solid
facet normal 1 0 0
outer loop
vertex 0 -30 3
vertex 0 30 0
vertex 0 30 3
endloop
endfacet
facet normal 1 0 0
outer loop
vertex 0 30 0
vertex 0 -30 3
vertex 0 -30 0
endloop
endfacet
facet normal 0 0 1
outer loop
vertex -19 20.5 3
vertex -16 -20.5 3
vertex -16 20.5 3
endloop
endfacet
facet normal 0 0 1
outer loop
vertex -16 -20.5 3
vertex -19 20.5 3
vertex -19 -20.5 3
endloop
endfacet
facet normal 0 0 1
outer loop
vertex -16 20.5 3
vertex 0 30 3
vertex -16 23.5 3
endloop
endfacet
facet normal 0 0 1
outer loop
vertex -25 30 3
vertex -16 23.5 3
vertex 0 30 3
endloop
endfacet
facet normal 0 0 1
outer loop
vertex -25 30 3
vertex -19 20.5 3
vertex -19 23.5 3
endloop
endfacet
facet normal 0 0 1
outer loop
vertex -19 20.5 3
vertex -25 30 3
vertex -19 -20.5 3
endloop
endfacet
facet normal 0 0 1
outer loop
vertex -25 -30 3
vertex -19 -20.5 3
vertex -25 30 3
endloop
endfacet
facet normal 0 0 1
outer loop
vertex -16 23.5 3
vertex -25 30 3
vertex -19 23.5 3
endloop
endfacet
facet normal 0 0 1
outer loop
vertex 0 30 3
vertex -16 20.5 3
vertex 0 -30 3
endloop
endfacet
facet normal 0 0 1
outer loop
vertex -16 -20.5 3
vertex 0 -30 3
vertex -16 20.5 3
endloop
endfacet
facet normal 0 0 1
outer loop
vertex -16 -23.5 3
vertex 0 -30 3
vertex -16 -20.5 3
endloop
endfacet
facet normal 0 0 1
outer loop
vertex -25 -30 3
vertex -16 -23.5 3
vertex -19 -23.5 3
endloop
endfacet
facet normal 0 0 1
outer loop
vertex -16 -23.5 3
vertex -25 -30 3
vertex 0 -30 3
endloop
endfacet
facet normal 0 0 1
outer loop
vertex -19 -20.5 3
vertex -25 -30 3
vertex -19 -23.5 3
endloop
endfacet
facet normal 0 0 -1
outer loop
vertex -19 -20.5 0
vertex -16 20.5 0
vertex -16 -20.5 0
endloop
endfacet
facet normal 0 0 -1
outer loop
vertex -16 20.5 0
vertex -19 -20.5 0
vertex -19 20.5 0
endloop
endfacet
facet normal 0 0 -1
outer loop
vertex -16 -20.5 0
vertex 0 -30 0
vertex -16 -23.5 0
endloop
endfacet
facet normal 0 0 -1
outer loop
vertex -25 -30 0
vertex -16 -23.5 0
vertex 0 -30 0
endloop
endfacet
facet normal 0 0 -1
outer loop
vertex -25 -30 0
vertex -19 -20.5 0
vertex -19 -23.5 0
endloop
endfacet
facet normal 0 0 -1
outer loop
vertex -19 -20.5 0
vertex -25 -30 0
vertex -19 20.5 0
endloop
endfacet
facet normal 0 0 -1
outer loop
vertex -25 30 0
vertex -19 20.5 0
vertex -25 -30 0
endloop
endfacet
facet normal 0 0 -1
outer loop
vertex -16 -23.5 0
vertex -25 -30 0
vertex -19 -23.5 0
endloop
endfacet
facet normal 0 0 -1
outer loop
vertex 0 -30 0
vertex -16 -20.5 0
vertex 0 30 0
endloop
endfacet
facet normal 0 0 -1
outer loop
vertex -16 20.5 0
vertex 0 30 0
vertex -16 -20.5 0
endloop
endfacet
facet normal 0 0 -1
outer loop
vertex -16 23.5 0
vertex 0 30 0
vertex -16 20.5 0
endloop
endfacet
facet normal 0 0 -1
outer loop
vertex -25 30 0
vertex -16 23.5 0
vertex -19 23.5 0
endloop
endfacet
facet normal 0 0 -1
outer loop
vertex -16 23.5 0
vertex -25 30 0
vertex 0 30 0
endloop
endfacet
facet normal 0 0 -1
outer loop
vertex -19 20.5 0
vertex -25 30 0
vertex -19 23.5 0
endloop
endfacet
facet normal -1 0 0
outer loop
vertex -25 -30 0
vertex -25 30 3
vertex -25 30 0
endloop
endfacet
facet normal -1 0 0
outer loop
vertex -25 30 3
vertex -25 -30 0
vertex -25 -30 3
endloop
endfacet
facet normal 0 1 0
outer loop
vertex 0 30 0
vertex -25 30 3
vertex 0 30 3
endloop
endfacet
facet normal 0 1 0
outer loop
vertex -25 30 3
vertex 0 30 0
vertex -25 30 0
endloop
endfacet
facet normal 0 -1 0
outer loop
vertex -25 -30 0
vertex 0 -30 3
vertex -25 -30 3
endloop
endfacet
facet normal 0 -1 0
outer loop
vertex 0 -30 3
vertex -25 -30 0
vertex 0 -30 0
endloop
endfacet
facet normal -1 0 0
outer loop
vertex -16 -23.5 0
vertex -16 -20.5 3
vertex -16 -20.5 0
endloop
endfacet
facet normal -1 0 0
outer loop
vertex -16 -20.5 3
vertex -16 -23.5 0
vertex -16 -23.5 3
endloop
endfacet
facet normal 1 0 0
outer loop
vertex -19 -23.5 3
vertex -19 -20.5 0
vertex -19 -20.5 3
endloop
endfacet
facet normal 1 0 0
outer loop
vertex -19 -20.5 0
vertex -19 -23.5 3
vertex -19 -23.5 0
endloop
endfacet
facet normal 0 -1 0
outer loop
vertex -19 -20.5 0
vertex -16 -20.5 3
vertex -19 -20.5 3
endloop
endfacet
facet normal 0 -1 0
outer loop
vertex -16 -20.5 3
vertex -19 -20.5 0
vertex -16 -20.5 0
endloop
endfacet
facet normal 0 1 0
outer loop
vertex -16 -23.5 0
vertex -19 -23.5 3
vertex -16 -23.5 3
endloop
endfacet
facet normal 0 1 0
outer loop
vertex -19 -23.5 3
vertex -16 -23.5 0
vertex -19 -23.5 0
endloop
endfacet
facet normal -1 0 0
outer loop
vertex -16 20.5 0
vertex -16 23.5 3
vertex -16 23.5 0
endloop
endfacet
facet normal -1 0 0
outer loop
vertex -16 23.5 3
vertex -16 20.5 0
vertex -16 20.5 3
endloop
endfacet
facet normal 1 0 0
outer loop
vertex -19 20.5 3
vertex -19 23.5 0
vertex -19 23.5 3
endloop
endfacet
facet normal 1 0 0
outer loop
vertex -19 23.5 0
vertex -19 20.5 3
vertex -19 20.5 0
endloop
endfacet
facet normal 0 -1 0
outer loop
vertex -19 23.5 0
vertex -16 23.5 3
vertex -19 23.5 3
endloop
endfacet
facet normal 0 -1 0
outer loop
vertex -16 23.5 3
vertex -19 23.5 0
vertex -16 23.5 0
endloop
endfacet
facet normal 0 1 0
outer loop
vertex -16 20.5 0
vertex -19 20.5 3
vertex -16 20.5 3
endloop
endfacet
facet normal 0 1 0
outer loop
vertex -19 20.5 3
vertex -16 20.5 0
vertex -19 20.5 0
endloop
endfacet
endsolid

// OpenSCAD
// file: config.scad
/**
 * All measures in millimeters.
 */

$fn = 200;
nothing = 0.05;

material_z = 3;

stairs_x = 150;
stairs_z = 120;

step_count = 7;
step_x = 25;
step_y = 60;
step_support_radius = step_x - material_z;

stairs_support_inset = 8;

step_color = "brown";
support_color = "yellow";
// main file
include <config.scad>;

module step_positive()
{
    color(step_color)
    translate([
        -step_x/2,
        0,
        material_z/2
        ])
    cube([
        step_x,
        step_y,
        material_z
        ], center=true);
}

module step()
{
    difference()
    {
        step_positive();

        // right side nose cutout
        translate([
            -step_support_radius + material_z*3/2,,
            -step_y/2 + stairs_support_inset,
            material_z/2
            ])
        cube([
            material_z,
            material_z,
            material_z*1.2
            ], center=true);

        // left side nose cutout
        translate([
            -step_support_radius + material_z*3/2,,
            +step_y/2 - stairs_support_inset,
            material_z/2
            ])
        cube([
            material_z,
            material_z,
            material_z*1.2
            ], center=true);
    }
}

module step_support_cylinder()
{
    intersection()
    {
        // lower left quadrant of the xz-plane
        translate([
            -stairs_x/2,
            0,
            -stairs_z/2
            ])
        cube([
            stairs_x,
            material_z,
            stairs_z
            ], center=true);

        // cylinder
        rotate([
            90,
            0,
            0
            ])
        cylinder(
            r=step_support_radius,
            h=material_z,
            center=true
            );
    }
}

module step_support()
{
    color(support_color)
    {
        step_support_cylinder();

        // nose
        translate([
            -step_support_radius + material_z*3/2,
            0,
            material_z/2
            ])
        cube([
            material_z,
            material_z,
            material_z + nothing
            ], center=true);
    }
}

step();

/*
translate([
    0,
    -step_y/2 + stairs_support_inset,
    0
    ])
step_support();
*/
